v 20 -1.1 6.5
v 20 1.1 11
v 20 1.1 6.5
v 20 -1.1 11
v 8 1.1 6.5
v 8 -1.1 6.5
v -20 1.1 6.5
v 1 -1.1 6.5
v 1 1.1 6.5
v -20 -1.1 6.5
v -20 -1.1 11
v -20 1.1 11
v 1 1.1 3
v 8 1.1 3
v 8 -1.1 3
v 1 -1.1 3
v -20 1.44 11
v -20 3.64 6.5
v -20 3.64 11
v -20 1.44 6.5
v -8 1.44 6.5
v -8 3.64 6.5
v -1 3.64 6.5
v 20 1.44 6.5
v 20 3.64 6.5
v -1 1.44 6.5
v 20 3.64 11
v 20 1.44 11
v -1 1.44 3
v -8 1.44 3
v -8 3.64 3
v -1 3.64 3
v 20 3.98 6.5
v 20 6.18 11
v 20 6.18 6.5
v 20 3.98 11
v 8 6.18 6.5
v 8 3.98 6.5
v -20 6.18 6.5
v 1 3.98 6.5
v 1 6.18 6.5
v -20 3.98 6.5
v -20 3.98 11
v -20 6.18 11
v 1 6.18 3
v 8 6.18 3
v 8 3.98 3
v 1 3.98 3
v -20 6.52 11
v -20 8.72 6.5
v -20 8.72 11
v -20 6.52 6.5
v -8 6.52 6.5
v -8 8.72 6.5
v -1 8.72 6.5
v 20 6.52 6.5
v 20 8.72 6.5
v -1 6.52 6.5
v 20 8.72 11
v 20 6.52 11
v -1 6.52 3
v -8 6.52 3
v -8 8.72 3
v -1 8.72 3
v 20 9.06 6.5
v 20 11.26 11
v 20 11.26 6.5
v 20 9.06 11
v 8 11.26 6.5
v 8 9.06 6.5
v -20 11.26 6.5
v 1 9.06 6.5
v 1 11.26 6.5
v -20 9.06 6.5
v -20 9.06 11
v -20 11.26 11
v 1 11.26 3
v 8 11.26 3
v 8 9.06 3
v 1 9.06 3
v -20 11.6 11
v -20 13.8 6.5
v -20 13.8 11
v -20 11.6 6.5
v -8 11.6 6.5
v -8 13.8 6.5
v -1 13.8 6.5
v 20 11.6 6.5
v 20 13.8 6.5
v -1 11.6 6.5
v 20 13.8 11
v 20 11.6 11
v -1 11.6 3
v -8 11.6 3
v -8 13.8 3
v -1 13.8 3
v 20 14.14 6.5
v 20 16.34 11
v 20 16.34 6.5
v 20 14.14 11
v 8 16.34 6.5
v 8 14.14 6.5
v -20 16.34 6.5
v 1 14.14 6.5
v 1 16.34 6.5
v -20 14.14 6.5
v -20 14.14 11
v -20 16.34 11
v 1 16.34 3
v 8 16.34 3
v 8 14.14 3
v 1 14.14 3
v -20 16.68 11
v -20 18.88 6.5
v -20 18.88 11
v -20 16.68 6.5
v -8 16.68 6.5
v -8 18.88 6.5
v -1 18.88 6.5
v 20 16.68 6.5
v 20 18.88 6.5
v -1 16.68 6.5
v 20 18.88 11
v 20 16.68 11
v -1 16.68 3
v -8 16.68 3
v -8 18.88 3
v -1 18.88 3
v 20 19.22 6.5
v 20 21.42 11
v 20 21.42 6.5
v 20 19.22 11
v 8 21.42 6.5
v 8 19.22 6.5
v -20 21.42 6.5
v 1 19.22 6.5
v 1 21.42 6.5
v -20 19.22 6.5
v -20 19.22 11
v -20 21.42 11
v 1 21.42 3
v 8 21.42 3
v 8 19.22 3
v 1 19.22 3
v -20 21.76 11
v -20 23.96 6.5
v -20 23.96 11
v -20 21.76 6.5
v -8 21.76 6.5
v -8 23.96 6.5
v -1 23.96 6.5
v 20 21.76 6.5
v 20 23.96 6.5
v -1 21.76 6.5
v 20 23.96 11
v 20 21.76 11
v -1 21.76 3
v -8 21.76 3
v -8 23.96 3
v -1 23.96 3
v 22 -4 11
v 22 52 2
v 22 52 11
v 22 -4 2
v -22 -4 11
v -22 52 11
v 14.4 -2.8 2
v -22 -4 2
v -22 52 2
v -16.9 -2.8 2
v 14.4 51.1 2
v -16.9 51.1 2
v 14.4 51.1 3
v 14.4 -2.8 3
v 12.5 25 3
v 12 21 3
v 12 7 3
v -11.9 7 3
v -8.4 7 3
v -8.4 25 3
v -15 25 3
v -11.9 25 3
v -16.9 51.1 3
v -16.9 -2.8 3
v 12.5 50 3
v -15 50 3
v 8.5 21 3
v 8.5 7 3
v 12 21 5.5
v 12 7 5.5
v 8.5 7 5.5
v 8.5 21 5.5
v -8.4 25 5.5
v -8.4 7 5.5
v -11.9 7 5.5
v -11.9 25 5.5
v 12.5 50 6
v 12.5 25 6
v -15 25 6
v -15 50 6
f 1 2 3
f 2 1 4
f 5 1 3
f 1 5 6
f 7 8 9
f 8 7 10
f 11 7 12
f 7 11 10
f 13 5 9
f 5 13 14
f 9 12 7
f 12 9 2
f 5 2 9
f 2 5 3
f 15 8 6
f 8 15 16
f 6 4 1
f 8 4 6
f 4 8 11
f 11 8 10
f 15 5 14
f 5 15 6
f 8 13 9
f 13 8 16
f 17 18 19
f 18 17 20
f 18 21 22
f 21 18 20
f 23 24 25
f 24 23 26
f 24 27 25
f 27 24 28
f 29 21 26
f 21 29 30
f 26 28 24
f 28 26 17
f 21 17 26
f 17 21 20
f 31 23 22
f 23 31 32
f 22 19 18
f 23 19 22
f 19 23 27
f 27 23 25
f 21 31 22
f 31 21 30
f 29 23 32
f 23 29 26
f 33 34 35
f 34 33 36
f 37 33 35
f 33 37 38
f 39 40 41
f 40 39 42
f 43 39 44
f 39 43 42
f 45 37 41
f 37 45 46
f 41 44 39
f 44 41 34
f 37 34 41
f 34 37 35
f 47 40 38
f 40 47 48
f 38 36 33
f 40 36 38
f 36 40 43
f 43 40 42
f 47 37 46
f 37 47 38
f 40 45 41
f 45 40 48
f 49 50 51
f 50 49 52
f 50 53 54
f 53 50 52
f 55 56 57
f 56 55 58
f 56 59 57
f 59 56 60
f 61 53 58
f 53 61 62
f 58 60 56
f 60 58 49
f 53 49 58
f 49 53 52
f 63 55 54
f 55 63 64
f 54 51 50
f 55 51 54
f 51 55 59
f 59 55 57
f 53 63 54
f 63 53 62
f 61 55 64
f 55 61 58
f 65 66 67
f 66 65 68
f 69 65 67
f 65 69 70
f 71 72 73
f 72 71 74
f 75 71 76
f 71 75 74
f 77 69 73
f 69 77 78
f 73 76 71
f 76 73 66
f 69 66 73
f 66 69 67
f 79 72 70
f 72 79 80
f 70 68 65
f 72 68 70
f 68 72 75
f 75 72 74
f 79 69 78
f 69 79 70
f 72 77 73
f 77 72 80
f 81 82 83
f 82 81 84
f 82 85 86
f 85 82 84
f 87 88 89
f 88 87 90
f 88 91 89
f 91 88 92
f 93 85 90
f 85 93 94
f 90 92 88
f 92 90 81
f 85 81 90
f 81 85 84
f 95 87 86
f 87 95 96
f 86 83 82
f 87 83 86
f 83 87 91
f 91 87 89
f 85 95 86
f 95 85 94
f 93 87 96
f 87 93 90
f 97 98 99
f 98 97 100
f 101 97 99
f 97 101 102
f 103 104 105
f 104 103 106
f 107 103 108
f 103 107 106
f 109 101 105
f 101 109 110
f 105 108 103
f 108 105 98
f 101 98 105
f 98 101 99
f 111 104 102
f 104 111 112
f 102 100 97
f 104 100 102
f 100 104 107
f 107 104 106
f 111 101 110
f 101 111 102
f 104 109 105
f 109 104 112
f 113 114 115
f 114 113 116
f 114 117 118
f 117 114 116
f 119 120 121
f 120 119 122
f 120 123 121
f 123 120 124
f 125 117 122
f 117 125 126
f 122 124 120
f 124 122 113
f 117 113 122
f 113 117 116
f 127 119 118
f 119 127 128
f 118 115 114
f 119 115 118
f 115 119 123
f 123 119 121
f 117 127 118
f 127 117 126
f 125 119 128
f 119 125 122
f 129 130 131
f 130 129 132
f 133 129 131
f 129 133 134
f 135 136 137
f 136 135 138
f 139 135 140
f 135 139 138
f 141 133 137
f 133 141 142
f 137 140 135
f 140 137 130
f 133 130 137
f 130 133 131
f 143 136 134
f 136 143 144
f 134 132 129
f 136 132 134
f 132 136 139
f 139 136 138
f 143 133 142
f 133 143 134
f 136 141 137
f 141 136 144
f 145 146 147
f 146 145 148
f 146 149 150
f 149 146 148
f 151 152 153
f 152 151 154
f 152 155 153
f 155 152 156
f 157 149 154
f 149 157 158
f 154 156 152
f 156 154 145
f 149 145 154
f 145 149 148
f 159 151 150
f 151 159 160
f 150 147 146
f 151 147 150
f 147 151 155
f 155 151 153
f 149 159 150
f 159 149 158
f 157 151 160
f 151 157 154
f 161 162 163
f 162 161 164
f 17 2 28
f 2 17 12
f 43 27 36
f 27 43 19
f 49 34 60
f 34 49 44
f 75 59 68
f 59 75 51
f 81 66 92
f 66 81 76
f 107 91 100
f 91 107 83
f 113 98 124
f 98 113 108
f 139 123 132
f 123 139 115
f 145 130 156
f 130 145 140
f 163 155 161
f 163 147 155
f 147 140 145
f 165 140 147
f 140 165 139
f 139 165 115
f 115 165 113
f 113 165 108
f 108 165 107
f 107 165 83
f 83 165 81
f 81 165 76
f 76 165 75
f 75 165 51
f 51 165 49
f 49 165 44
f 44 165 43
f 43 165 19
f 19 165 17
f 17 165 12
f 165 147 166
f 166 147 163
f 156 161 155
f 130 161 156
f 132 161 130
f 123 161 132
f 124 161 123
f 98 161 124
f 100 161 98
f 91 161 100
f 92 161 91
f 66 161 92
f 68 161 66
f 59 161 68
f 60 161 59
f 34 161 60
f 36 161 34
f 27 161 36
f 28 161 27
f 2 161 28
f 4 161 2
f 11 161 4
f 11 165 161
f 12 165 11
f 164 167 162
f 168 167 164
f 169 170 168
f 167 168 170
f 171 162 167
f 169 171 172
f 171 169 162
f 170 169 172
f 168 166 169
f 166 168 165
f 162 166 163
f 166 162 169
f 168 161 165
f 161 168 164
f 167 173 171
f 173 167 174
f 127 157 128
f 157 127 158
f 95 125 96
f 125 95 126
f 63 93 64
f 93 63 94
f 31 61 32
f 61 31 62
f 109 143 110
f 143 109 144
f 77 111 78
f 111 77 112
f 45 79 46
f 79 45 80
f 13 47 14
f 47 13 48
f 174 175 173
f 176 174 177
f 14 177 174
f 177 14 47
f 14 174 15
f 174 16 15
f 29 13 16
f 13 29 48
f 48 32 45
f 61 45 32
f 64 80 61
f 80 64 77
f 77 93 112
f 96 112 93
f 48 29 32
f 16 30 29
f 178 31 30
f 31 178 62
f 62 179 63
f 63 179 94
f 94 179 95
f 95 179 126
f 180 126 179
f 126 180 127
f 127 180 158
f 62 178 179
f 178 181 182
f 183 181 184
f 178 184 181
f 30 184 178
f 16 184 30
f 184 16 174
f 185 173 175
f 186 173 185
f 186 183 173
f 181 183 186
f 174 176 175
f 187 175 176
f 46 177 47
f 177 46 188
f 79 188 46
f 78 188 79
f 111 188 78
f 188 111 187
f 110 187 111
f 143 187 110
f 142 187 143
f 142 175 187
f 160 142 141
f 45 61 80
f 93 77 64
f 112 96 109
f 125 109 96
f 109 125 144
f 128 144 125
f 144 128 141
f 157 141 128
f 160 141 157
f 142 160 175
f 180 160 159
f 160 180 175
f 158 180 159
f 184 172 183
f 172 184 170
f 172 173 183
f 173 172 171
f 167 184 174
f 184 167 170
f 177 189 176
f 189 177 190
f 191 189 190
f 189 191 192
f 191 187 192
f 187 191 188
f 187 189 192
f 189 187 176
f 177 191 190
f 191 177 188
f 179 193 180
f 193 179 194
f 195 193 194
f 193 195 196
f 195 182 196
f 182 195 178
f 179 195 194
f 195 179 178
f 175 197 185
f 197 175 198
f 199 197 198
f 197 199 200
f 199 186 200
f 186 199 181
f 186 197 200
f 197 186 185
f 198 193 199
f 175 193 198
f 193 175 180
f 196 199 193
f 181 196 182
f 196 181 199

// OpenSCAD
SPACING = 2.54;

module sheet() {
    translate([-20, -1.1, 0]) {
        translate([0, 0, 5]) {
            cube([40, 2.2, 50]);
        }
        translate([21, 0, 0]) {
            cube([7, 2.2, 10]);
        }
    }
}

module sheet_even() {
    sheet();
}

module sheet_odd() {
    rotate([0, 0, 180]) {
        sheet();
    }
}

module stack(sheets) {
    for (i = [0 : sheets - 1]) {
        translate([0, i * SPACING, 0]) {
            if (i % 2 == 0) {
                sheet_even();
            } else {
                sheet_odd();
            }
        }
    }
}

/*translate([0, 0, 0]) {
    rotate([90, 0, 270]) {
        #import("digit-node.stl");
    }
}*/

/*translate([0, 0, 0]) {
    rotate([270, 180, 90]) {
        import("digit-node.stl");
    }
}*/

difference() {
    translate([-22, -4, 2]) {
        cube([44, 56, 9]);
    }
    translate([0, 0, 1.5]) {
        stack(10);
    }
    
    // PCB cavity
    translate([-16.9,-2.8,0]) {
        cube([31.3, 53.9, 3]);
    }
    
    // Pin headers
    translate([8.5, 7, 1]) {
        cube([3.5, 14, 4.5]);
    }
    translate([-11.9, 7, 1]) {
        cube([3.5, 24, 4.5]);
    }
    
    // Component area
    translate([-15, 25, 1]) {
        cube([27.5, 25, 5]);
    }
}

/*color("green") {
    translate([-1, -3, 1]) {
        cube([2, 2 + 10 * SPACING, 3]);
    }
    
    translate([-22, -3, 0.5]) {
        cube([44, 2, 3]);
        
        for (i = [1 : 9]) {
            translate([0, SPACING * i + 1, 0]) {
                cube([44, 1, 3]);
            }
        }
        
        translate([0, 27, 0]) {
            cube([44, 28, 3]);
        }
    }
    
    
    for (i = [0 : 1]) {
        mirror([i, 0, 0]) {
            translate([-22, -3, 0.5]) {
                cube([10, 40, 3]);
            }
        }
    }
}*/
